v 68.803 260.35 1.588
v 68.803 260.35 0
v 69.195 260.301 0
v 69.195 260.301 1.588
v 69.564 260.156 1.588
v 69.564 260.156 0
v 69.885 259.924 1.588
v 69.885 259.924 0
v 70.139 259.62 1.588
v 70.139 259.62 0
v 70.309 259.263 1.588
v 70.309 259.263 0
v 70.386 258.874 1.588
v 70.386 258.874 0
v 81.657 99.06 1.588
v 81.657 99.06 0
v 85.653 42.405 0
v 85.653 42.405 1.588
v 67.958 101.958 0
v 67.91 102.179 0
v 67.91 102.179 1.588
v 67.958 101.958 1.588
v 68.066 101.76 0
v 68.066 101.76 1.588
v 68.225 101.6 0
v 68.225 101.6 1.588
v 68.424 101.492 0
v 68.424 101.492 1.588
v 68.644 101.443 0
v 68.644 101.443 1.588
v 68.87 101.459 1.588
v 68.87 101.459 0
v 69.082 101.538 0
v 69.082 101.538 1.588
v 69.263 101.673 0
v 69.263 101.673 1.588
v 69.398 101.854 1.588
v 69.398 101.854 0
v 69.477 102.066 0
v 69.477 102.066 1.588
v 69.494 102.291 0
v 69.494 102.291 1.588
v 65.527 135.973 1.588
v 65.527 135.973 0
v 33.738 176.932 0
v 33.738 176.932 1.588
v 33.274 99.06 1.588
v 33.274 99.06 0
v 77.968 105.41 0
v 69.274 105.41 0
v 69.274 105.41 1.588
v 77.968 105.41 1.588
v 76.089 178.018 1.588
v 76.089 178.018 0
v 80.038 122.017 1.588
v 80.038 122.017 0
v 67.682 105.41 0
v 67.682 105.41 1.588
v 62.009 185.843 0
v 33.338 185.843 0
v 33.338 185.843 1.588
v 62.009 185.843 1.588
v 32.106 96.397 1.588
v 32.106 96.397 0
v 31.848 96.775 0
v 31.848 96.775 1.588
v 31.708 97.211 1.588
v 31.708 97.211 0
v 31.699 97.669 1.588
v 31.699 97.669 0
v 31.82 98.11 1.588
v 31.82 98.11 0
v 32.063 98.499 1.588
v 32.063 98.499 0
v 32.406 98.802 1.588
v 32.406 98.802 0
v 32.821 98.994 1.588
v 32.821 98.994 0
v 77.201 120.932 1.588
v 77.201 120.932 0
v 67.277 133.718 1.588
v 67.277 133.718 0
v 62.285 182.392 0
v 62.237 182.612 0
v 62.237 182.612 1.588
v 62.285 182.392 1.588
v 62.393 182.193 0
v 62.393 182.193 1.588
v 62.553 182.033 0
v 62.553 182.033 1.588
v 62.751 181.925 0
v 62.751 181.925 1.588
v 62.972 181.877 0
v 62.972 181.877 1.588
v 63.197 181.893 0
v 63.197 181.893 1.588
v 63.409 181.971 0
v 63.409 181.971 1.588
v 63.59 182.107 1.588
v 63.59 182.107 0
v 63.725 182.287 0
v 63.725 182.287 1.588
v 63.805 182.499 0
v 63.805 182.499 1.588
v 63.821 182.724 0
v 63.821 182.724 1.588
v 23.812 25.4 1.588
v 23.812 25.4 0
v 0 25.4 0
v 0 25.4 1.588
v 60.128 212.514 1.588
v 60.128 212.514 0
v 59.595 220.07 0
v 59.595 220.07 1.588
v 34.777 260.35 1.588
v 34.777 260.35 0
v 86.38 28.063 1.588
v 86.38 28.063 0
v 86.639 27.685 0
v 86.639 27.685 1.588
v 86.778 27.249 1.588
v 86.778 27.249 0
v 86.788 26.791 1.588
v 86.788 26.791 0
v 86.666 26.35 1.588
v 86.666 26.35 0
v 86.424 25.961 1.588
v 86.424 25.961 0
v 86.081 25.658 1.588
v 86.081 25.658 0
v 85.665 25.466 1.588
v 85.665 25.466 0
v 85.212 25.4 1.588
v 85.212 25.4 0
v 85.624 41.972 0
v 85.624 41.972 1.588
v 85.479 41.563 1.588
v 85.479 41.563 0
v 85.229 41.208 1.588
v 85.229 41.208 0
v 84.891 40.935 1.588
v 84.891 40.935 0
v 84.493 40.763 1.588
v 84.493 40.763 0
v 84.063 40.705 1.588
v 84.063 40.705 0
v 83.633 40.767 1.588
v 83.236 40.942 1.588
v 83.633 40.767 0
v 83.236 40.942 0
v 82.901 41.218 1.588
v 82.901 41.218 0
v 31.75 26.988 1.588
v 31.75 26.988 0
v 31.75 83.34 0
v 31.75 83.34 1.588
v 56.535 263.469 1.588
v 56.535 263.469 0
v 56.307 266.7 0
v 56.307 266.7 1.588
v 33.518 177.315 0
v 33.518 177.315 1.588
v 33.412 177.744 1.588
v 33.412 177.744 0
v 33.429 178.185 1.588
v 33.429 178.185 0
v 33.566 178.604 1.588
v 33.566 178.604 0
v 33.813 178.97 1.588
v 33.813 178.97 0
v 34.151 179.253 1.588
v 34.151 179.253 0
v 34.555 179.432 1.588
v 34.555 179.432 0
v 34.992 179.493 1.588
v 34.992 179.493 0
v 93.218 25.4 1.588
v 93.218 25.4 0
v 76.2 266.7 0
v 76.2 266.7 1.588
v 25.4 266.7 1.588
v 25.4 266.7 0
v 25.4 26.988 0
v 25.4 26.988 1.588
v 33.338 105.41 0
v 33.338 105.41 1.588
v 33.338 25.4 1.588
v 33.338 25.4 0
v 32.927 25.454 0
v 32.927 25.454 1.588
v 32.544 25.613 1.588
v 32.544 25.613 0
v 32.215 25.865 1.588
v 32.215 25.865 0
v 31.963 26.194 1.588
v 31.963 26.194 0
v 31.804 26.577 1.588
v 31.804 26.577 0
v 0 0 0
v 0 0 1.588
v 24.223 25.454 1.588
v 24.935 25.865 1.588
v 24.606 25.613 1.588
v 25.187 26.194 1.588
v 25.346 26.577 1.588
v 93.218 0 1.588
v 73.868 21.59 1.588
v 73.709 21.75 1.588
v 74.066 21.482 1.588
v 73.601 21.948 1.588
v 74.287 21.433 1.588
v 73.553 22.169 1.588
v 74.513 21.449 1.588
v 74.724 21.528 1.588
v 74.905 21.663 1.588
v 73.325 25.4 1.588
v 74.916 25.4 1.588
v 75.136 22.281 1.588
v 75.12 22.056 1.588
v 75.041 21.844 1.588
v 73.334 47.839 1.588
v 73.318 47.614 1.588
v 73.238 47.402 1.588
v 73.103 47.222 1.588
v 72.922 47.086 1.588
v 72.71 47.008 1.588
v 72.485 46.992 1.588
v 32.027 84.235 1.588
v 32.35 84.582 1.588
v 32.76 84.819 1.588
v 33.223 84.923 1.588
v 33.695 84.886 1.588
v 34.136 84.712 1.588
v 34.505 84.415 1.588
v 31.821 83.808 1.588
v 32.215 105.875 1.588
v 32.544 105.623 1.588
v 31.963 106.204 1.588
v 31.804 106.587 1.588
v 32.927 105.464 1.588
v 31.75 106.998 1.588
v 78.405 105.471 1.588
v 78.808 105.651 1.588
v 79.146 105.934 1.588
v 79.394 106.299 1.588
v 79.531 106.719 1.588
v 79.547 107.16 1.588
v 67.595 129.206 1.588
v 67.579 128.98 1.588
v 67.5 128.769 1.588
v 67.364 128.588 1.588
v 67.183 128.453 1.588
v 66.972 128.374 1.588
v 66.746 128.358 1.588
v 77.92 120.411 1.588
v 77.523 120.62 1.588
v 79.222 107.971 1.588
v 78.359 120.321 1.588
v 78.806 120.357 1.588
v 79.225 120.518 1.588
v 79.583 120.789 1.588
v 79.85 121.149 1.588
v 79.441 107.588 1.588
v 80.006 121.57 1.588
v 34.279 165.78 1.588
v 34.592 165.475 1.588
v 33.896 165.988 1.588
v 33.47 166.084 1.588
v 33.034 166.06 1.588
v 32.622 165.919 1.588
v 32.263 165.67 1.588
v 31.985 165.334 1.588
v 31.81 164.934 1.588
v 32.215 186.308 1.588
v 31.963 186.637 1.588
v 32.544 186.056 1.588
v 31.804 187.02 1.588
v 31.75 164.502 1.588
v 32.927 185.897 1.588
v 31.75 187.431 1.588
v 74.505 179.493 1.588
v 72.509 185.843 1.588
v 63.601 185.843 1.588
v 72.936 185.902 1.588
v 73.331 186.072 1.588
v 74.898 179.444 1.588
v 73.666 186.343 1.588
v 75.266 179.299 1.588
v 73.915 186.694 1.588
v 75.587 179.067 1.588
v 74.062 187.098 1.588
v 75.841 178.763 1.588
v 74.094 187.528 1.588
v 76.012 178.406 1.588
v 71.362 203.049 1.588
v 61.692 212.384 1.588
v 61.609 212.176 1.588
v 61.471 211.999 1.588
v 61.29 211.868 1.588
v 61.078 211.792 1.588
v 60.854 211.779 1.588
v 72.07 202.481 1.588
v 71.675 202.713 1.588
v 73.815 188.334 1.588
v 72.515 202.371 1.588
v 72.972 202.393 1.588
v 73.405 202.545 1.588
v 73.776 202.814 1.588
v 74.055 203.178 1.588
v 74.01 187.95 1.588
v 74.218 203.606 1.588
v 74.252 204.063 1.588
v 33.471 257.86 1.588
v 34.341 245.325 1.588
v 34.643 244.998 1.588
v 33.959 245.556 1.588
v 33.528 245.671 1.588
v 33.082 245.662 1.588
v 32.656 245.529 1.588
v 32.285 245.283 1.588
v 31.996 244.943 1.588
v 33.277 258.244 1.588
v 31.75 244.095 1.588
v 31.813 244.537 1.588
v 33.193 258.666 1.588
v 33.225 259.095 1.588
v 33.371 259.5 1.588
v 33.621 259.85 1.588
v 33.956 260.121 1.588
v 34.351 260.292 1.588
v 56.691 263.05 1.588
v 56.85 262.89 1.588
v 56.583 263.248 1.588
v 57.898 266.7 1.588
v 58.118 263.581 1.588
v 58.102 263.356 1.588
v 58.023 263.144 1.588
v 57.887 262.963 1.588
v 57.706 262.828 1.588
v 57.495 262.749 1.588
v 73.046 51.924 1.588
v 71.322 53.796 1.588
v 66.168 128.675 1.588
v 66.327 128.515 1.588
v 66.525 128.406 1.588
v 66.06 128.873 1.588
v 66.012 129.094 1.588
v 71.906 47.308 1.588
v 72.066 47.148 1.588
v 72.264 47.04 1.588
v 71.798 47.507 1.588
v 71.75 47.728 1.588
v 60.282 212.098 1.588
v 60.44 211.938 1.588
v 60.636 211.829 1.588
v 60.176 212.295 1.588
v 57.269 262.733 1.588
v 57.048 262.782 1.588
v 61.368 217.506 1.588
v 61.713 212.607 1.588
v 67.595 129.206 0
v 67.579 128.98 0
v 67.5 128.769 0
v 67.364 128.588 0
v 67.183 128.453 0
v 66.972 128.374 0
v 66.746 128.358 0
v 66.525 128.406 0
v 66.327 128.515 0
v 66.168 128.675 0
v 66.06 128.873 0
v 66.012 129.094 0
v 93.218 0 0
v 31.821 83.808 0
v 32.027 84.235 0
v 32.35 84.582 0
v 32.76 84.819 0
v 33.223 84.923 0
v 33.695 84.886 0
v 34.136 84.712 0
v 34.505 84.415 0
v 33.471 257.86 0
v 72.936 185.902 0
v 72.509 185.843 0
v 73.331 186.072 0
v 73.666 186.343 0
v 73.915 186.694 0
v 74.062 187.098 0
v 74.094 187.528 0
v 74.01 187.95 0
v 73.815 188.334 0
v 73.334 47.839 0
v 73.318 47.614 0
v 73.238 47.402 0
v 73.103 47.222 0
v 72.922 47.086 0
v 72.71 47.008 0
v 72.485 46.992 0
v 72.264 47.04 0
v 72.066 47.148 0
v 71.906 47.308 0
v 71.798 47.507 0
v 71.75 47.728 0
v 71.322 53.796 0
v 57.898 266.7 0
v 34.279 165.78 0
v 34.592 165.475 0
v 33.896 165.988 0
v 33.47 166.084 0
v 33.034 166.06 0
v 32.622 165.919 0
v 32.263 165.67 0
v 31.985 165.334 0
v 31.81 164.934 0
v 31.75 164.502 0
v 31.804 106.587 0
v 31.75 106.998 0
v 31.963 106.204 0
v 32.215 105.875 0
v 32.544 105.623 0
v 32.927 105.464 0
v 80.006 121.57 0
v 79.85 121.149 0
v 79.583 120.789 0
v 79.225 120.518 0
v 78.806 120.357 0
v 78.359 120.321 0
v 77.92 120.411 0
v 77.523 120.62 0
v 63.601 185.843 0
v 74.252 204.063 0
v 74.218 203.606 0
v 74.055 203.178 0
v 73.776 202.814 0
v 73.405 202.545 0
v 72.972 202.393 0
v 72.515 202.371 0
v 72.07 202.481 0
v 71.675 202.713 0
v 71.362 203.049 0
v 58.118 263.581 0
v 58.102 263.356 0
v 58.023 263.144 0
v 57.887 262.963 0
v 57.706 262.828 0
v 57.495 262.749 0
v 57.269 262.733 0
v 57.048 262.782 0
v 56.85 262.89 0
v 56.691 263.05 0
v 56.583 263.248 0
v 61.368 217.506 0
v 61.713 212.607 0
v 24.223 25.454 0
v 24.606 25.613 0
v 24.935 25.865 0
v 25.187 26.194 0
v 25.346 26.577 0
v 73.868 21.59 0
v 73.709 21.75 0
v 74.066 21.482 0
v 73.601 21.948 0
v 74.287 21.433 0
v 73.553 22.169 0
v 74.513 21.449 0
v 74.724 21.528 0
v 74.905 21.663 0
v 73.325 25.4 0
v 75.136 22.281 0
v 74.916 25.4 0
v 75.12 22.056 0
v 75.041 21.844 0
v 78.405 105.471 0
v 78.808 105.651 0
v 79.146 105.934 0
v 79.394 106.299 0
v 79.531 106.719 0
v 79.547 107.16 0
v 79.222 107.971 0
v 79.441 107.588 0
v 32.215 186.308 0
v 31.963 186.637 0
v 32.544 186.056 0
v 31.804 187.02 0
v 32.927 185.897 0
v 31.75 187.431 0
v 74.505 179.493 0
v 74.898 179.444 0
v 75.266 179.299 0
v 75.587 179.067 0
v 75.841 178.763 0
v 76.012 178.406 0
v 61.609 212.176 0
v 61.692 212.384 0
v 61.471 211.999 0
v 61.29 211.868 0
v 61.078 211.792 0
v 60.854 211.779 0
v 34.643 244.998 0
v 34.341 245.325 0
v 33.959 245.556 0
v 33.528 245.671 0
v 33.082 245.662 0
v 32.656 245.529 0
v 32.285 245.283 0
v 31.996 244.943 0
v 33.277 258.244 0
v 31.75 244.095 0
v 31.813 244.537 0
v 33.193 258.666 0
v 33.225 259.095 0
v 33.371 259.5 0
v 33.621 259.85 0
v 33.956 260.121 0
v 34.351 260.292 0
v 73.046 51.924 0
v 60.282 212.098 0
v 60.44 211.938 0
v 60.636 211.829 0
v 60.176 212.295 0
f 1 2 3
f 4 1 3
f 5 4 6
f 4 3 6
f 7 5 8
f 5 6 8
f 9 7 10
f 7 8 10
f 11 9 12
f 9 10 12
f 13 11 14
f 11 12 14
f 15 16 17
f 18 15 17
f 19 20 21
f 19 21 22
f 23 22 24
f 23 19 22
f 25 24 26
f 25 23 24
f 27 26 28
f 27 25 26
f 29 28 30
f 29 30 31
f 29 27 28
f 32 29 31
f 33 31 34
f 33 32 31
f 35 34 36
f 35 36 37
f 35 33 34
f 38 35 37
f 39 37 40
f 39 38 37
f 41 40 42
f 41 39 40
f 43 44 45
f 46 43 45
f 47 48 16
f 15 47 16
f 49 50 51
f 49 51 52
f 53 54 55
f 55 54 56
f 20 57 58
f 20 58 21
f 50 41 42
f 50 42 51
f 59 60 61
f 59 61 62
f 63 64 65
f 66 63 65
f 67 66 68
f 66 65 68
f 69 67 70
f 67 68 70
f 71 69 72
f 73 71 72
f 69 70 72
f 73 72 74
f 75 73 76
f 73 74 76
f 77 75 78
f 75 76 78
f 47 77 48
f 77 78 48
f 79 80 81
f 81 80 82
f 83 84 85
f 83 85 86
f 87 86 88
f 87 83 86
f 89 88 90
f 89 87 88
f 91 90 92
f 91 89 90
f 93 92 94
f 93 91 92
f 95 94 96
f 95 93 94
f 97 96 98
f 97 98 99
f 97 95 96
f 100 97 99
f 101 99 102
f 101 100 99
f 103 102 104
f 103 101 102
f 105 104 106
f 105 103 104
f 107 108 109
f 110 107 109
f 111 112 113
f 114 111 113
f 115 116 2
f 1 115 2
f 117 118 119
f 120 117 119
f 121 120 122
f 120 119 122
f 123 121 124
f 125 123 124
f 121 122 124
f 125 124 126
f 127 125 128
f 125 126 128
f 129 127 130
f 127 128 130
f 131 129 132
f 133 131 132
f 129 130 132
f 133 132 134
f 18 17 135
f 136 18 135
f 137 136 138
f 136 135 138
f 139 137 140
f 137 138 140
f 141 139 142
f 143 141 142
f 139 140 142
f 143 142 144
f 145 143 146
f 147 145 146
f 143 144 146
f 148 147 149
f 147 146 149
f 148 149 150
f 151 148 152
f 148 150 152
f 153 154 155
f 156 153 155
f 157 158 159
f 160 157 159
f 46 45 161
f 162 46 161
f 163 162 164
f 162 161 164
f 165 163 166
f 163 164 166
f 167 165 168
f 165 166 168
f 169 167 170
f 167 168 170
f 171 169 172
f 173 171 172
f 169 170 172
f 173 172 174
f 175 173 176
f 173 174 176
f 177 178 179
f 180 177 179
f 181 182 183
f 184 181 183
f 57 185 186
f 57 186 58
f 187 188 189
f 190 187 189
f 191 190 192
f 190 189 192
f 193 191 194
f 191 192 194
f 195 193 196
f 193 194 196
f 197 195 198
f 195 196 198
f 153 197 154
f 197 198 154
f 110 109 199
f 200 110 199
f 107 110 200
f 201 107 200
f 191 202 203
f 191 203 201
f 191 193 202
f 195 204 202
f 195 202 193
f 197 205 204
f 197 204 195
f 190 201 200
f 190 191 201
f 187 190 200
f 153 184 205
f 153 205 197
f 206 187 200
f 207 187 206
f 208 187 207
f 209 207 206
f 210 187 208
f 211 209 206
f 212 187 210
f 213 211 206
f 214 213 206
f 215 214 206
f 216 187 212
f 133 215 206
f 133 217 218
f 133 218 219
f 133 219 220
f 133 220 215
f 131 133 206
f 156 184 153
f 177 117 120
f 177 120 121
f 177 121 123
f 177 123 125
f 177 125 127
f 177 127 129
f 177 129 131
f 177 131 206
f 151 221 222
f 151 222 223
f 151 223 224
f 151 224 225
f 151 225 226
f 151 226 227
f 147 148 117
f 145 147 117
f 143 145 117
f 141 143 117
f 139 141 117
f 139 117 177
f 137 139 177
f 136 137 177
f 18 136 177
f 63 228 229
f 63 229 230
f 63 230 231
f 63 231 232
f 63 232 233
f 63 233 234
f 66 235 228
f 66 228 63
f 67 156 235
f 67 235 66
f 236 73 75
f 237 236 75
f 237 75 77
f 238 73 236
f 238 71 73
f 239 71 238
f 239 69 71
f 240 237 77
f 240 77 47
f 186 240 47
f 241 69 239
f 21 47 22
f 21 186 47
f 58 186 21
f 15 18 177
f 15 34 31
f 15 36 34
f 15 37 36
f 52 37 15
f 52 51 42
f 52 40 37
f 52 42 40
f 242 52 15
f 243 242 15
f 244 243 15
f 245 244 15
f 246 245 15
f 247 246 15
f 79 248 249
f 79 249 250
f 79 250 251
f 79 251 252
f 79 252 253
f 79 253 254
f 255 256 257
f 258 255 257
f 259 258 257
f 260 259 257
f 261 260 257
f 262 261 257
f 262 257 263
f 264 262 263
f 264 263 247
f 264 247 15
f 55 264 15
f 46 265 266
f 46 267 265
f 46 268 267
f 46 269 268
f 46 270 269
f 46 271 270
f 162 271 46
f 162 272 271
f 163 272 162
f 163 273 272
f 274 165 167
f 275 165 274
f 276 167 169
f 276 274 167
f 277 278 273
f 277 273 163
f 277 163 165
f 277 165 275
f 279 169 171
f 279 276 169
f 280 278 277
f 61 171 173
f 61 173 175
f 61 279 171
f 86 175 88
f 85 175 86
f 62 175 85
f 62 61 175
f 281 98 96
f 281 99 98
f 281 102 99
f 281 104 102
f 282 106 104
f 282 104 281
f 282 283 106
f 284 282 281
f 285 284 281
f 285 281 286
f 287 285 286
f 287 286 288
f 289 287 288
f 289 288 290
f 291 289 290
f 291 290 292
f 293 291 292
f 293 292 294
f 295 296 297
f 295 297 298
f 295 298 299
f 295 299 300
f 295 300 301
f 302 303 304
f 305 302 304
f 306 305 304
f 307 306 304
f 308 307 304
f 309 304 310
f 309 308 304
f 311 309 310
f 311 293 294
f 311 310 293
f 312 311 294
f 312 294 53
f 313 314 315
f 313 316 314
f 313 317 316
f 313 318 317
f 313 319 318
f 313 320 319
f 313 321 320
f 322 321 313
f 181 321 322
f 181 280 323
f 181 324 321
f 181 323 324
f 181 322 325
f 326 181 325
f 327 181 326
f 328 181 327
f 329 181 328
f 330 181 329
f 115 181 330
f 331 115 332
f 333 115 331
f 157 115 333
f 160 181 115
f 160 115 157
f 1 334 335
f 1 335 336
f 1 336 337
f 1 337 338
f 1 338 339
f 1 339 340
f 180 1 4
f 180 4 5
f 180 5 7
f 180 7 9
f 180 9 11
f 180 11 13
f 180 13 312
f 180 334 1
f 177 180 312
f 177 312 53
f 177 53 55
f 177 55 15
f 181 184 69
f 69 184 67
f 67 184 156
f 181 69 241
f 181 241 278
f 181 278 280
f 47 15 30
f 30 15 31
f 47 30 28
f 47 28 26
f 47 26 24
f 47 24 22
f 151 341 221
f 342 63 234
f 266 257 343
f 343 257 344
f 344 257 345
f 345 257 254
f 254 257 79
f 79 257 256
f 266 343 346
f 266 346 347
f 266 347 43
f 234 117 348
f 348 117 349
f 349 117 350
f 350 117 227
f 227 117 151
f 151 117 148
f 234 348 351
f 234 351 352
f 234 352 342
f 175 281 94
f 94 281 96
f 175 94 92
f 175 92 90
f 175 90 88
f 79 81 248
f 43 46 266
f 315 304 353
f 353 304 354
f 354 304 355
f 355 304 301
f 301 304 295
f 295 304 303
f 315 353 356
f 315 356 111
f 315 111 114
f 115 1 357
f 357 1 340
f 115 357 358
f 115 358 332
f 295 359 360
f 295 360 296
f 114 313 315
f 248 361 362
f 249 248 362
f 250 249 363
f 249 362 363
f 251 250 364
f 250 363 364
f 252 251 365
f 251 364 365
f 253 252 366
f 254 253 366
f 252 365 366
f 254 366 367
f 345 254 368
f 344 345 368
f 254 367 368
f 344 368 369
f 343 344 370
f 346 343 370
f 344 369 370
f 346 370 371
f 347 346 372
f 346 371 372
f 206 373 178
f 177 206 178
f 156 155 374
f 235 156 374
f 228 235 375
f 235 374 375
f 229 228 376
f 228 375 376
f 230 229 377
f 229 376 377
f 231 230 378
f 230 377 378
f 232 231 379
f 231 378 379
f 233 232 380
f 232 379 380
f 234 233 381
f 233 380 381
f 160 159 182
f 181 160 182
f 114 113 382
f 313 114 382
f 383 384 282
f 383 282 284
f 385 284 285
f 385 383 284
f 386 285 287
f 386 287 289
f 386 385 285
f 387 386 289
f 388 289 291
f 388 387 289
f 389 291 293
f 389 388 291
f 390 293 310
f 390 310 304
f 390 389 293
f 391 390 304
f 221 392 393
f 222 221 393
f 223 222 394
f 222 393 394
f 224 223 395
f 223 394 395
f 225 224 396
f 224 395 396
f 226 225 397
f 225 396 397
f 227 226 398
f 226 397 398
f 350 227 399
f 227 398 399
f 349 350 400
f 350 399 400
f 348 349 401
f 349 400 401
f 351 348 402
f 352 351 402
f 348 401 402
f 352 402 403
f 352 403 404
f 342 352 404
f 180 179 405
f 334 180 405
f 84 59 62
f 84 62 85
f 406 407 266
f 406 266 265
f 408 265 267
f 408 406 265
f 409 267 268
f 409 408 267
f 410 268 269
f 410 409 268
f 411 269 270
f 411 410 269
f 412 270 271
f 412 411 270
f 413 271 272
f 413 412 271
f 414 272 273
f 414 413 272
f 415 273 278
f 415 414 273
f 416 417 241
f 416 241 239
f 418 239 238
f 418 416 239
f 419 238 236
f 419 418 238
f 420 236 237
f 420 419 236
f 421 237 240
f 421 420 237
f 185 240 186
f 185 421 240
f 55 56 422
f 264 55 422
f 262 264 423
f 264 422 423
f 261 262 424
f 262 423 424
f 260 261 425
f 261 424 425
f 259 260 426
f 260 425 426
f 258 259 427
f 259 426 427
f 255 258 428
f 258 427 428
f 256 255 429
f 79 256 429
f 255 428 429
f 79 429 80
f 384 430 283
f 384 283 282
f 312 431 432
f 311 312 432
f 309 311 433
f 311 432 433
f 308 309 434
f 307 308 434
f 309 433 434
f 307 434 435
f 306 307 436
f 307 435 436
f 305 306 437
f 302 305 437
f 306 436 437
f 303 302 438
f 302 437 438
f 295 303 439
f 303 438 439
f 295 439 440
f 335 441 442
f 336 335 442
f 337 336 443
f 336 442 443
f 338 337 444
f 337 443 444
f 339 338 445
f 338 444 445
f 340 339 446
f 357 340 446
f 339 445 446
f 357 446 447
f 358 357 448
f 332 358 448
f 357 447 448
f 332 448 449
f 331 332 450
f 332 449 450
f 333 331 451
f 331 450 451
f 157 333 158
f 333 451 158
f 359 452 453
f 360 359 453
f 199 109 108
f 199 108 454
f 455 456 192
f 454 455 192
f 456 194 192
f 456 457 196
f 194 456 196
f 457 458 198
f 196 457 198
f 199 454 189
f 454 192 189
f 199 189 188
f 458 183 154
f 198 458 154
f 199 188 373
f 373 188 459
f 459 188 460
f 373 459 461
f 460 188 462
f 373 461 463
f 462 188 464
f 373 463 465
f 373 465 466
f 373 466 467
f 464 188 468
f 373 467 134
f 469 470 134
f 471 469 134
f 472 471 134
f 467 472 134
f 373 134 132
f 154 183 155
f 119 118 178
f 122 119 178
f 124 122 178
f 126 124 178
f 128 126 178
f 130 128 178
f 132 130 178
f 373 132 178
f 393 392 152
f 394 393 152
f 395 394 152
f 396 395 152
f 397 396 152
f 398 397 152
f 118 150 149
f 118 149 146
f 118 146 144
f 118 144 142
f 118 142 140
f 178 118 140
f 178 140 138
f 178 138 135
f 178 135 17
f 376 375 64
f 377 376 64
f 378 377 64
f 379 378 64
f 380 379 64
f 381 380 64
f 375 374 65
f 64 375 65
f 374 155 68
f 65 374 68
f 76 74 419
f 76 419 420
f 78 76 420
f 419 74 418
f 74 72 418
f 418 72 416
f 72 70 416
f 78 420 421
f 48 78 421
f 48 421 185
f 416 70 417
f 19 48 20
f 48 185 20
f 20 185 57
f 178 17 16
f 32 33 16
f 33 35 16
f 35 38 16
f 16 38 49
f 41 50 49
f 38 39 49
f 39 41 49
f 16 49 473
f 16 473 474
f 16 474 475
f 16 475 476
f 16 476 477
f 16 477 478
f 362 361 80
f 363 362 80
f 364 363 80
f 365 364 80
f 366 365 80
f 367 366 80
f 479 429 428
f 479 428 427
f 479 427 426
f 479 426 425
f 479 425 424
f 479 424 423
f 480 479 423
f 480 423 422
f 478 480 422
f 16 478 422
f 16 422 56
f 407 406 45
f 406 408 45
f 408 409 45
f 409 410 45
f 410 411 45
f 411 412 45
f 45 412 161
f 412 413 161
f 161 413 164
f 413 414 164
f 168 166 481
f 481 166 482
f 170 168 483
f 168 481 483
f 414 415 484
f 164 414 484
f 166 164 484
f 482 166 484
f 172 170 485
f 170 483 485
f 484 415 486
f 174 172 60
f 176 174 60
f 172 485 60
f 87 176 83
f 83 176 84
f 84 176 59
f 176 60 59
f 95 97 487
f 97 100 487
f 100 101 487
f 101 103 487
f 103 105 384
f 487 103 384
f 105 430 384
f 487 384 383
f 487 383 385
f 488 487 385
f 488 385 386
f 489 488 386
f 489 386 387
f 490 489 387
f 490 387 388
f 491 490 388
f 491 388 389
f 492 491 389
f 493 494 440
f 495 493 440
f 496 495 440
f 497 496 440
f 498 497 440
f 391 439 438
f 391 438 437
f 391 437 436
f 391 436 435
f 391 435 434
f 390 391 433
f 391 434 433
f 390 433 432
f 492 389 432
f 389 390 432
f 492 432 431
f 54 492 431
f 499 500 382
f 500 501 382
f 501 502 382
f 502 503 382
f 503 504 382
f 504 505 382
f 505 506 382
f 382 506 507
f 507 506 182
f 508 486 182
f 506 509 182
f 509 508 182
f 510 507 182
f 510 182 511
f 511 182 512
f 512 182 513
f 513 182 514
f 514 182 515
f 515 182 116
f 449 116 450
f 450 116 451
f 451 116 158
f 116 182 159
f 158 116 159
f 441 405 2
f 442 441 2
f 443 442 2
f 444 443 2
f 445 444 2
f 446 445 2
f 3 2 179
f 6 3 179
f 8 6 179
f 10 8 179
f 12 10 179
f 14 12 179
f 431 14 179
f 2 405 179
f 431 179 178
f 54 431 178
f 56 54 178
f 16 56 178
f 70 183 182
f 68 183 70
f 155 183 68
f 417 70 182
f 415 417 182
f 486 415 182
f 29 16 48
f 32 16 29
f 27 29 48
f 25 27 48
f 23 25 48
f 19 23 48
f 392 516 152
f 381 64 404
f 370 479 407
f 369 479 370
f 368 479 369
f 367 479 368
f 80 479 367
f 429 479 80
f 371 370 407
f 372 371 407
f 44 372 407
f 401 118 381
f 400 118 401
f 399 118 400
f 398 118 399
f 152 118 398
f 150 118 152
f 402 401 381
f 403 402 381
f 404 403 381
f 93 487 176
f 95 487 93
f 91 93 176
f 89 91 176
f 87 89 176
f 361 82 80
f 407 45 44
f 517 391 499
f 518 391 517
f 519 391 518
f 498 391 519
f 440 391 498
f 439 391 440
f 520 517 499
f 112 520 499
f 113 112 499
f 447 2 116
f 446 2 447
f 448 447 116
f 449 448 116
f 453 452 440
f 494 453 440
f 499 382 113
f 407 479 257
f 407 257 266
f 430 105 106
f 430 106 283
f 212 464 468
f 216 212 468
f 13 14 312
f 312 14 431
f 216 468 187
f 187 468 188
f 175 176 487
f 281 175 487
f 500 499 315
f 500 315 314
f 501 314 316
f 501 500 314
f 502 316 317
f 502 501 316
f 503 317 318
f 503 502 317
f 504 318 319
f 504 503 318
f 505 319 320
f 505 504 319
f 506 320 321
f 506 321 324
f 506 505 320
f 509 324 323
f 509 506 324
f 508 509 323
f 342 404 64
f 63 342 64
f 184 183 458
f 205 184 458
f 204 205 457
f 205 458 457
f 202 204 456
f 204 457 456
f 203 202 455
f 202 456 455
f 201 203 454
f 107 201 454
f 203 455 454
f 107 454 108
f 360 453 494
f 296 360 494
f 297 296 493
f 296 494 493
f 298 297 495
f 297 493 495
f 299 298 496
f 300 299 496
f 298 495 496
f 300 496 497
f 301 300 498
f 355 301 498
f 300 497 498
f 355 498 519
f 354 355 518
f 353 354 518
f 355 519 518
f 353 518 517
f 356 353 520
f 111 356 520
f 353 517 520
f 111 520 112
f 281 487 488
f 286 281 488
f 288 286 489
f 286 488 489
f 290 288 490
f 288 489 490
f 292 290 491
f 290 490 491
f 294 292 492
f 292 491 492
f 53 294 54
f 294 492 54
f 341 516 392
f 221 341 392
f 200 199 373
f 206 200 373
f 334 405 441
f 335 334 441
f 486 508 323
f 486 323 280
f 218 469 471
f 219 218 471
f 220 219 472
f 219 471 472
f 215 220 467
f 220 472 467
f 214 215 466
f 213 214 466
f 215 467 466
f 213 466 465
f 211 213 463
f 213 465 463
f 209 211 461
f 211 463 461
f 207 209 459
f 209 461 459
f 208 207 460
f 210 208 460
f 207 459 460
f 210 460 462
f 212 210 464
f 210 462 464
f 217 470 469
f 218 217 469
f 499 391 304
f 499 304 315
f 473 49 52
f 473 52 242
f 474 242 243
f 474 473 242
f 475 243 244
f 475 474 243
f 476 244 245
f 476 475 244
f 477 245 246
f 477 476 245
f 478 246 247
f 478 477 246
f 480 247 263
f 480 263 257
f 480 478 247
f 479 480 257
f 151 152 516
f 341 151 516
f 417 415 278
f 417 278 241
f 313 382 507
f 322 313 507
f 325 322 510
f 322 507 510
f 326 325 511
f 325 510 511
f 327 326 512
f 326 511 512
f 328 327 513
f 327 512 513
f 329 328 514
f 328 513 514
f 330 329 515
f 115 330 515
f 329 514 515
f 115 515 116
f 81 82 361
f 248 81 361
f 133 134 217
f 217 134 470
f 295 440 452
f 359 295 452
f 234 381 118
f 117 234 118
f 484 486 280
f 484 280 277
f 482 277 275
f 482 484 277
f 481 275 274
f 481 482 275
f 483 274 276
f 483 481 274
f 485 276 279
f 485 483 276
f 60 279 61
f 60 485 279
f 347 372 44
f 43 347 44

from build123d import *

# Parameters (mm, degrees)
BOSS_EXTRUDE2_DEPTH = 1.5875


with BuildPart() as part:
    # Sketch2 → Boss-Extrude2 (new body)
    with BuildSketch(Plane.XY):
        with BuildLine():
            Line((0, 0), (22.726605384, 0))
            Line((22.726605384, 0), (25.4, 0))
            Line((25.4, 0), (93.218, 0))
            Line((93.218, 0), (93.218, 25.4))
            Line((93.218, 25.4), (76.2, 266.7))
            Line((76.2, 266.7), (57.898403378, 266.7))
            Line((57.898403378, 266.7), (58.118386132, 263.580841559))
            ThreePointArc((58.118386132, 263.580841559), (57.382444397, 262.733216707), (56.534819546, 263.469158441))
            Line((56.534819546, 263.469158441), (56.306960194, 266.7))
            Line((56.306960194, 266.7), (25.4, 266.7))
            Line((25.4, 266.7), (25.4, 26.9875))
            ThreePointArc((25.4, 26.9875), (24.935032015, 25.864967985), (23.8125, 25.4))
            Line((23.8125, 25.4), (0, 25.4))
            Line((0, 25.4), (0, 0))
        make_face()
        with BuildLine():
            Line((34.777339087, 260.35), (68.802586709, 260.35))
            ThreePointArc((68.802586709, 260.35), (69.884912746, 259.92384689), (70.386153295, 258.874183117))
            Line((70.386153295, 258.874183117), (74.25178186, 204.063031823))
            ThreePointArc((74.25178186, 204.063031823), (73.194086522, 202.453478324), (71.362368826, 203.048618789))
            Line((71.362368826, 203.048618789), (61.367737995, 217.506379541))
            Line((61.367737995, 217.506379541), (61.713239359, 212.607479611))
            ThreePointArc((61.713239359, 212.607479611), (60.966778576, 211.777785767), (60.128358495, 212.514431775))
            Line((60.128358495, 212.514431775), (59.595490006, 220.070029749))
            Line((59.595490006, 220.070029749), (33.471492639, 257.859770083))
            ThreePointArc((33.471492639, 257.859770083), (33.371415904, 259.499749112), (34.777339087, 260.35))
        make_face(mode=Mode.SUBTRACT)
        with BuildLine():
            Line((81.657258841, 99.06), (85.652951472, 42.404656719))
            ThreePointArc((85.652951472, 42.404656719), (84.6981432, 40.835297632), (82.901413184, 41.217799964))
            Line((82.901413184, 41.217799964), (73.045756556, 51.924096733))
            Line((73.045756556, 51.924096733), (73.333849522, 47.839196468))
            ThreePointArc((73.333849522, 47.839196468), (72.597907788, 46.991571616), (71.750282937, 47.727513351))
            Line((71.750282937, 47.727513351), (71.322271249, 53.796335779))
            Line((71.322271249, 53.796335779), (32.106028298, 96.397326362))
            ThreePointArc((32.106028298, 96.397326362), (31.820212808, 98.110198243), (33.274, 99.06))
            Line((33.274, 99.06), (81.657258841, 99.06))
        make_face(mode=Mode.SUBTRACT)
        with BuildLine():
            Line((31.75, 26.9875), (31.75, 83.339802581))
            ThreePointArc((31.75, 83.339802581), (32.76043797, 84.818706115), (34.505471702, 84.414976219))
            Line((34.505471702, 84.414976219), (86.380452981, 28.062673638))
            ThreePointArc((86.380452981, 28.062673638), (86.666268471, 26.349801757), (85.212481279, 25.4))
            Line((85.212481279, 25.4), (74.916403378, 25.4))
            Line((74.916403378, 25.4), (75.136386132, 22.280841559))
            ThreePointArc((75.136386132, 22.280841559), (74.400444397, 21.433216707), (73.552819546, 22.169158441))
            Line((73.552819546, 22.169158441), (73.324960194, 25.4))
            Line((73.324960194, 25.4), (33.3375, 25.4))
            ThreePointArc((33.3375, 25.4), (32.214967985, 25.864967985), (31.75, 26.9875))
        make_face(mode=Mode.SUBTRACT)
        with BuildLine():
            Line((79.221902862, 107.970834504), (34.591603741, 165.475243131))
            ThreePointArc((34.591603741, 165.475243131), (32.823074805, 166.003748488), (31.75, 164.501908627))
            Line((31.75, 164.501908627), (31.75, 106.9975))
            ThreePointArc((31.75, 106.9975), (32.214967985, 105.874967985), (33.3375, 105.41))
            Line((33.3375, 105.41), (67.682149668, 105.41))
            Line((67.682149668, 105.41), (67.91000902, 102.179158441))
            ThreePointArc((67.91000902, 102.179158441), (68.757633871, 101.443216707), (69.493575605, 102.290841559))
            Line((69.493575605, 102.290841559), (69.273592852, 105.41))
            Line((69.273592852, 105.41), (77.967799122, 105.41))
            ThreePointArc((77.967799122, 105.41), (79.393513815, 106.299292393), (79.221902862, 107.970834504))
        make_face(mode=Mode.SUBTRACT)
        with BuildLine():
            Line((34.991617614, 179.493333333), (74.505109516, 179.493333333))
            ThreePointArc((74.505109516, 179.493333333), (75.587435553, 179.067180223), (76.088676102, 178.01751645))
            Line((76.088676102, 178.01751645), (80.038176523, 122.017137338))
            ThreePointArc((80.038176523, 122.017137338), (79.021577531, 120.42265147), (77.200506197, 120.932119716))
            Line((77.200506197, 120.932119716), (67.277133916, 133.717999844))
            Line((67.277133916, 133.717999844), (67.59537819, 129.205581031))
            ThreePointArc((67.59537819, 129.205581031), (66.859436456, 128.357956179), (66.011811604, 129.093897913))
            Line((66.011811604, 129.093897913), (65.526620874, 135.973467973))
            Line((65.526620874, 135.973467973), (33.737513874, 176.932498829))
            ThreePointArc((33.737513874, 176.932498829), (33.56590292, 178.60404094), (34.991617614, 179.493333333))
        make_face(mode=Mode.SUBTRACT)
        with BuildLine():
            Line((73.81525743, 188.333563251), (34.643346448, 244.997798955))
            ThreePointArc((34.643346448, 244.997798955), (32.86467603, 245.610520701), (31.75, 244.095069038))
            Line((31.75, 244.095069038), (31.75, 187.430833333))
            ThreePointArc((31.75, 187.430833333), (32.214967985, 186.308301318), (33.3375, 185.843333333))
            Line((33.3375, 185.843333333), (62.009483001, 185.843333333))
            Line((62.009483001, 185.843333333), (62.237342353, 182.612491775))
            ThreePointArc((62.237342353, 182.612491775), (63.084967204, 181.87655004), (63.820908939, 182.724174892))
            Line((63.820908939, 182.724174892), (63.600926185, 185.843333333))
            Line((63.600926185, 185.843333333), (72.509410982, 185.843333333))
            ThreePointArc((72.509410982, 185.843333333), (73.915334165, 186.693584221), (73.81525743, 188.333563251))
        make_face(mode=Mode.SUBTRACT)
    extrude(amount=BOSS_EXTRUDE2_DEPTH)


solid = part.part
